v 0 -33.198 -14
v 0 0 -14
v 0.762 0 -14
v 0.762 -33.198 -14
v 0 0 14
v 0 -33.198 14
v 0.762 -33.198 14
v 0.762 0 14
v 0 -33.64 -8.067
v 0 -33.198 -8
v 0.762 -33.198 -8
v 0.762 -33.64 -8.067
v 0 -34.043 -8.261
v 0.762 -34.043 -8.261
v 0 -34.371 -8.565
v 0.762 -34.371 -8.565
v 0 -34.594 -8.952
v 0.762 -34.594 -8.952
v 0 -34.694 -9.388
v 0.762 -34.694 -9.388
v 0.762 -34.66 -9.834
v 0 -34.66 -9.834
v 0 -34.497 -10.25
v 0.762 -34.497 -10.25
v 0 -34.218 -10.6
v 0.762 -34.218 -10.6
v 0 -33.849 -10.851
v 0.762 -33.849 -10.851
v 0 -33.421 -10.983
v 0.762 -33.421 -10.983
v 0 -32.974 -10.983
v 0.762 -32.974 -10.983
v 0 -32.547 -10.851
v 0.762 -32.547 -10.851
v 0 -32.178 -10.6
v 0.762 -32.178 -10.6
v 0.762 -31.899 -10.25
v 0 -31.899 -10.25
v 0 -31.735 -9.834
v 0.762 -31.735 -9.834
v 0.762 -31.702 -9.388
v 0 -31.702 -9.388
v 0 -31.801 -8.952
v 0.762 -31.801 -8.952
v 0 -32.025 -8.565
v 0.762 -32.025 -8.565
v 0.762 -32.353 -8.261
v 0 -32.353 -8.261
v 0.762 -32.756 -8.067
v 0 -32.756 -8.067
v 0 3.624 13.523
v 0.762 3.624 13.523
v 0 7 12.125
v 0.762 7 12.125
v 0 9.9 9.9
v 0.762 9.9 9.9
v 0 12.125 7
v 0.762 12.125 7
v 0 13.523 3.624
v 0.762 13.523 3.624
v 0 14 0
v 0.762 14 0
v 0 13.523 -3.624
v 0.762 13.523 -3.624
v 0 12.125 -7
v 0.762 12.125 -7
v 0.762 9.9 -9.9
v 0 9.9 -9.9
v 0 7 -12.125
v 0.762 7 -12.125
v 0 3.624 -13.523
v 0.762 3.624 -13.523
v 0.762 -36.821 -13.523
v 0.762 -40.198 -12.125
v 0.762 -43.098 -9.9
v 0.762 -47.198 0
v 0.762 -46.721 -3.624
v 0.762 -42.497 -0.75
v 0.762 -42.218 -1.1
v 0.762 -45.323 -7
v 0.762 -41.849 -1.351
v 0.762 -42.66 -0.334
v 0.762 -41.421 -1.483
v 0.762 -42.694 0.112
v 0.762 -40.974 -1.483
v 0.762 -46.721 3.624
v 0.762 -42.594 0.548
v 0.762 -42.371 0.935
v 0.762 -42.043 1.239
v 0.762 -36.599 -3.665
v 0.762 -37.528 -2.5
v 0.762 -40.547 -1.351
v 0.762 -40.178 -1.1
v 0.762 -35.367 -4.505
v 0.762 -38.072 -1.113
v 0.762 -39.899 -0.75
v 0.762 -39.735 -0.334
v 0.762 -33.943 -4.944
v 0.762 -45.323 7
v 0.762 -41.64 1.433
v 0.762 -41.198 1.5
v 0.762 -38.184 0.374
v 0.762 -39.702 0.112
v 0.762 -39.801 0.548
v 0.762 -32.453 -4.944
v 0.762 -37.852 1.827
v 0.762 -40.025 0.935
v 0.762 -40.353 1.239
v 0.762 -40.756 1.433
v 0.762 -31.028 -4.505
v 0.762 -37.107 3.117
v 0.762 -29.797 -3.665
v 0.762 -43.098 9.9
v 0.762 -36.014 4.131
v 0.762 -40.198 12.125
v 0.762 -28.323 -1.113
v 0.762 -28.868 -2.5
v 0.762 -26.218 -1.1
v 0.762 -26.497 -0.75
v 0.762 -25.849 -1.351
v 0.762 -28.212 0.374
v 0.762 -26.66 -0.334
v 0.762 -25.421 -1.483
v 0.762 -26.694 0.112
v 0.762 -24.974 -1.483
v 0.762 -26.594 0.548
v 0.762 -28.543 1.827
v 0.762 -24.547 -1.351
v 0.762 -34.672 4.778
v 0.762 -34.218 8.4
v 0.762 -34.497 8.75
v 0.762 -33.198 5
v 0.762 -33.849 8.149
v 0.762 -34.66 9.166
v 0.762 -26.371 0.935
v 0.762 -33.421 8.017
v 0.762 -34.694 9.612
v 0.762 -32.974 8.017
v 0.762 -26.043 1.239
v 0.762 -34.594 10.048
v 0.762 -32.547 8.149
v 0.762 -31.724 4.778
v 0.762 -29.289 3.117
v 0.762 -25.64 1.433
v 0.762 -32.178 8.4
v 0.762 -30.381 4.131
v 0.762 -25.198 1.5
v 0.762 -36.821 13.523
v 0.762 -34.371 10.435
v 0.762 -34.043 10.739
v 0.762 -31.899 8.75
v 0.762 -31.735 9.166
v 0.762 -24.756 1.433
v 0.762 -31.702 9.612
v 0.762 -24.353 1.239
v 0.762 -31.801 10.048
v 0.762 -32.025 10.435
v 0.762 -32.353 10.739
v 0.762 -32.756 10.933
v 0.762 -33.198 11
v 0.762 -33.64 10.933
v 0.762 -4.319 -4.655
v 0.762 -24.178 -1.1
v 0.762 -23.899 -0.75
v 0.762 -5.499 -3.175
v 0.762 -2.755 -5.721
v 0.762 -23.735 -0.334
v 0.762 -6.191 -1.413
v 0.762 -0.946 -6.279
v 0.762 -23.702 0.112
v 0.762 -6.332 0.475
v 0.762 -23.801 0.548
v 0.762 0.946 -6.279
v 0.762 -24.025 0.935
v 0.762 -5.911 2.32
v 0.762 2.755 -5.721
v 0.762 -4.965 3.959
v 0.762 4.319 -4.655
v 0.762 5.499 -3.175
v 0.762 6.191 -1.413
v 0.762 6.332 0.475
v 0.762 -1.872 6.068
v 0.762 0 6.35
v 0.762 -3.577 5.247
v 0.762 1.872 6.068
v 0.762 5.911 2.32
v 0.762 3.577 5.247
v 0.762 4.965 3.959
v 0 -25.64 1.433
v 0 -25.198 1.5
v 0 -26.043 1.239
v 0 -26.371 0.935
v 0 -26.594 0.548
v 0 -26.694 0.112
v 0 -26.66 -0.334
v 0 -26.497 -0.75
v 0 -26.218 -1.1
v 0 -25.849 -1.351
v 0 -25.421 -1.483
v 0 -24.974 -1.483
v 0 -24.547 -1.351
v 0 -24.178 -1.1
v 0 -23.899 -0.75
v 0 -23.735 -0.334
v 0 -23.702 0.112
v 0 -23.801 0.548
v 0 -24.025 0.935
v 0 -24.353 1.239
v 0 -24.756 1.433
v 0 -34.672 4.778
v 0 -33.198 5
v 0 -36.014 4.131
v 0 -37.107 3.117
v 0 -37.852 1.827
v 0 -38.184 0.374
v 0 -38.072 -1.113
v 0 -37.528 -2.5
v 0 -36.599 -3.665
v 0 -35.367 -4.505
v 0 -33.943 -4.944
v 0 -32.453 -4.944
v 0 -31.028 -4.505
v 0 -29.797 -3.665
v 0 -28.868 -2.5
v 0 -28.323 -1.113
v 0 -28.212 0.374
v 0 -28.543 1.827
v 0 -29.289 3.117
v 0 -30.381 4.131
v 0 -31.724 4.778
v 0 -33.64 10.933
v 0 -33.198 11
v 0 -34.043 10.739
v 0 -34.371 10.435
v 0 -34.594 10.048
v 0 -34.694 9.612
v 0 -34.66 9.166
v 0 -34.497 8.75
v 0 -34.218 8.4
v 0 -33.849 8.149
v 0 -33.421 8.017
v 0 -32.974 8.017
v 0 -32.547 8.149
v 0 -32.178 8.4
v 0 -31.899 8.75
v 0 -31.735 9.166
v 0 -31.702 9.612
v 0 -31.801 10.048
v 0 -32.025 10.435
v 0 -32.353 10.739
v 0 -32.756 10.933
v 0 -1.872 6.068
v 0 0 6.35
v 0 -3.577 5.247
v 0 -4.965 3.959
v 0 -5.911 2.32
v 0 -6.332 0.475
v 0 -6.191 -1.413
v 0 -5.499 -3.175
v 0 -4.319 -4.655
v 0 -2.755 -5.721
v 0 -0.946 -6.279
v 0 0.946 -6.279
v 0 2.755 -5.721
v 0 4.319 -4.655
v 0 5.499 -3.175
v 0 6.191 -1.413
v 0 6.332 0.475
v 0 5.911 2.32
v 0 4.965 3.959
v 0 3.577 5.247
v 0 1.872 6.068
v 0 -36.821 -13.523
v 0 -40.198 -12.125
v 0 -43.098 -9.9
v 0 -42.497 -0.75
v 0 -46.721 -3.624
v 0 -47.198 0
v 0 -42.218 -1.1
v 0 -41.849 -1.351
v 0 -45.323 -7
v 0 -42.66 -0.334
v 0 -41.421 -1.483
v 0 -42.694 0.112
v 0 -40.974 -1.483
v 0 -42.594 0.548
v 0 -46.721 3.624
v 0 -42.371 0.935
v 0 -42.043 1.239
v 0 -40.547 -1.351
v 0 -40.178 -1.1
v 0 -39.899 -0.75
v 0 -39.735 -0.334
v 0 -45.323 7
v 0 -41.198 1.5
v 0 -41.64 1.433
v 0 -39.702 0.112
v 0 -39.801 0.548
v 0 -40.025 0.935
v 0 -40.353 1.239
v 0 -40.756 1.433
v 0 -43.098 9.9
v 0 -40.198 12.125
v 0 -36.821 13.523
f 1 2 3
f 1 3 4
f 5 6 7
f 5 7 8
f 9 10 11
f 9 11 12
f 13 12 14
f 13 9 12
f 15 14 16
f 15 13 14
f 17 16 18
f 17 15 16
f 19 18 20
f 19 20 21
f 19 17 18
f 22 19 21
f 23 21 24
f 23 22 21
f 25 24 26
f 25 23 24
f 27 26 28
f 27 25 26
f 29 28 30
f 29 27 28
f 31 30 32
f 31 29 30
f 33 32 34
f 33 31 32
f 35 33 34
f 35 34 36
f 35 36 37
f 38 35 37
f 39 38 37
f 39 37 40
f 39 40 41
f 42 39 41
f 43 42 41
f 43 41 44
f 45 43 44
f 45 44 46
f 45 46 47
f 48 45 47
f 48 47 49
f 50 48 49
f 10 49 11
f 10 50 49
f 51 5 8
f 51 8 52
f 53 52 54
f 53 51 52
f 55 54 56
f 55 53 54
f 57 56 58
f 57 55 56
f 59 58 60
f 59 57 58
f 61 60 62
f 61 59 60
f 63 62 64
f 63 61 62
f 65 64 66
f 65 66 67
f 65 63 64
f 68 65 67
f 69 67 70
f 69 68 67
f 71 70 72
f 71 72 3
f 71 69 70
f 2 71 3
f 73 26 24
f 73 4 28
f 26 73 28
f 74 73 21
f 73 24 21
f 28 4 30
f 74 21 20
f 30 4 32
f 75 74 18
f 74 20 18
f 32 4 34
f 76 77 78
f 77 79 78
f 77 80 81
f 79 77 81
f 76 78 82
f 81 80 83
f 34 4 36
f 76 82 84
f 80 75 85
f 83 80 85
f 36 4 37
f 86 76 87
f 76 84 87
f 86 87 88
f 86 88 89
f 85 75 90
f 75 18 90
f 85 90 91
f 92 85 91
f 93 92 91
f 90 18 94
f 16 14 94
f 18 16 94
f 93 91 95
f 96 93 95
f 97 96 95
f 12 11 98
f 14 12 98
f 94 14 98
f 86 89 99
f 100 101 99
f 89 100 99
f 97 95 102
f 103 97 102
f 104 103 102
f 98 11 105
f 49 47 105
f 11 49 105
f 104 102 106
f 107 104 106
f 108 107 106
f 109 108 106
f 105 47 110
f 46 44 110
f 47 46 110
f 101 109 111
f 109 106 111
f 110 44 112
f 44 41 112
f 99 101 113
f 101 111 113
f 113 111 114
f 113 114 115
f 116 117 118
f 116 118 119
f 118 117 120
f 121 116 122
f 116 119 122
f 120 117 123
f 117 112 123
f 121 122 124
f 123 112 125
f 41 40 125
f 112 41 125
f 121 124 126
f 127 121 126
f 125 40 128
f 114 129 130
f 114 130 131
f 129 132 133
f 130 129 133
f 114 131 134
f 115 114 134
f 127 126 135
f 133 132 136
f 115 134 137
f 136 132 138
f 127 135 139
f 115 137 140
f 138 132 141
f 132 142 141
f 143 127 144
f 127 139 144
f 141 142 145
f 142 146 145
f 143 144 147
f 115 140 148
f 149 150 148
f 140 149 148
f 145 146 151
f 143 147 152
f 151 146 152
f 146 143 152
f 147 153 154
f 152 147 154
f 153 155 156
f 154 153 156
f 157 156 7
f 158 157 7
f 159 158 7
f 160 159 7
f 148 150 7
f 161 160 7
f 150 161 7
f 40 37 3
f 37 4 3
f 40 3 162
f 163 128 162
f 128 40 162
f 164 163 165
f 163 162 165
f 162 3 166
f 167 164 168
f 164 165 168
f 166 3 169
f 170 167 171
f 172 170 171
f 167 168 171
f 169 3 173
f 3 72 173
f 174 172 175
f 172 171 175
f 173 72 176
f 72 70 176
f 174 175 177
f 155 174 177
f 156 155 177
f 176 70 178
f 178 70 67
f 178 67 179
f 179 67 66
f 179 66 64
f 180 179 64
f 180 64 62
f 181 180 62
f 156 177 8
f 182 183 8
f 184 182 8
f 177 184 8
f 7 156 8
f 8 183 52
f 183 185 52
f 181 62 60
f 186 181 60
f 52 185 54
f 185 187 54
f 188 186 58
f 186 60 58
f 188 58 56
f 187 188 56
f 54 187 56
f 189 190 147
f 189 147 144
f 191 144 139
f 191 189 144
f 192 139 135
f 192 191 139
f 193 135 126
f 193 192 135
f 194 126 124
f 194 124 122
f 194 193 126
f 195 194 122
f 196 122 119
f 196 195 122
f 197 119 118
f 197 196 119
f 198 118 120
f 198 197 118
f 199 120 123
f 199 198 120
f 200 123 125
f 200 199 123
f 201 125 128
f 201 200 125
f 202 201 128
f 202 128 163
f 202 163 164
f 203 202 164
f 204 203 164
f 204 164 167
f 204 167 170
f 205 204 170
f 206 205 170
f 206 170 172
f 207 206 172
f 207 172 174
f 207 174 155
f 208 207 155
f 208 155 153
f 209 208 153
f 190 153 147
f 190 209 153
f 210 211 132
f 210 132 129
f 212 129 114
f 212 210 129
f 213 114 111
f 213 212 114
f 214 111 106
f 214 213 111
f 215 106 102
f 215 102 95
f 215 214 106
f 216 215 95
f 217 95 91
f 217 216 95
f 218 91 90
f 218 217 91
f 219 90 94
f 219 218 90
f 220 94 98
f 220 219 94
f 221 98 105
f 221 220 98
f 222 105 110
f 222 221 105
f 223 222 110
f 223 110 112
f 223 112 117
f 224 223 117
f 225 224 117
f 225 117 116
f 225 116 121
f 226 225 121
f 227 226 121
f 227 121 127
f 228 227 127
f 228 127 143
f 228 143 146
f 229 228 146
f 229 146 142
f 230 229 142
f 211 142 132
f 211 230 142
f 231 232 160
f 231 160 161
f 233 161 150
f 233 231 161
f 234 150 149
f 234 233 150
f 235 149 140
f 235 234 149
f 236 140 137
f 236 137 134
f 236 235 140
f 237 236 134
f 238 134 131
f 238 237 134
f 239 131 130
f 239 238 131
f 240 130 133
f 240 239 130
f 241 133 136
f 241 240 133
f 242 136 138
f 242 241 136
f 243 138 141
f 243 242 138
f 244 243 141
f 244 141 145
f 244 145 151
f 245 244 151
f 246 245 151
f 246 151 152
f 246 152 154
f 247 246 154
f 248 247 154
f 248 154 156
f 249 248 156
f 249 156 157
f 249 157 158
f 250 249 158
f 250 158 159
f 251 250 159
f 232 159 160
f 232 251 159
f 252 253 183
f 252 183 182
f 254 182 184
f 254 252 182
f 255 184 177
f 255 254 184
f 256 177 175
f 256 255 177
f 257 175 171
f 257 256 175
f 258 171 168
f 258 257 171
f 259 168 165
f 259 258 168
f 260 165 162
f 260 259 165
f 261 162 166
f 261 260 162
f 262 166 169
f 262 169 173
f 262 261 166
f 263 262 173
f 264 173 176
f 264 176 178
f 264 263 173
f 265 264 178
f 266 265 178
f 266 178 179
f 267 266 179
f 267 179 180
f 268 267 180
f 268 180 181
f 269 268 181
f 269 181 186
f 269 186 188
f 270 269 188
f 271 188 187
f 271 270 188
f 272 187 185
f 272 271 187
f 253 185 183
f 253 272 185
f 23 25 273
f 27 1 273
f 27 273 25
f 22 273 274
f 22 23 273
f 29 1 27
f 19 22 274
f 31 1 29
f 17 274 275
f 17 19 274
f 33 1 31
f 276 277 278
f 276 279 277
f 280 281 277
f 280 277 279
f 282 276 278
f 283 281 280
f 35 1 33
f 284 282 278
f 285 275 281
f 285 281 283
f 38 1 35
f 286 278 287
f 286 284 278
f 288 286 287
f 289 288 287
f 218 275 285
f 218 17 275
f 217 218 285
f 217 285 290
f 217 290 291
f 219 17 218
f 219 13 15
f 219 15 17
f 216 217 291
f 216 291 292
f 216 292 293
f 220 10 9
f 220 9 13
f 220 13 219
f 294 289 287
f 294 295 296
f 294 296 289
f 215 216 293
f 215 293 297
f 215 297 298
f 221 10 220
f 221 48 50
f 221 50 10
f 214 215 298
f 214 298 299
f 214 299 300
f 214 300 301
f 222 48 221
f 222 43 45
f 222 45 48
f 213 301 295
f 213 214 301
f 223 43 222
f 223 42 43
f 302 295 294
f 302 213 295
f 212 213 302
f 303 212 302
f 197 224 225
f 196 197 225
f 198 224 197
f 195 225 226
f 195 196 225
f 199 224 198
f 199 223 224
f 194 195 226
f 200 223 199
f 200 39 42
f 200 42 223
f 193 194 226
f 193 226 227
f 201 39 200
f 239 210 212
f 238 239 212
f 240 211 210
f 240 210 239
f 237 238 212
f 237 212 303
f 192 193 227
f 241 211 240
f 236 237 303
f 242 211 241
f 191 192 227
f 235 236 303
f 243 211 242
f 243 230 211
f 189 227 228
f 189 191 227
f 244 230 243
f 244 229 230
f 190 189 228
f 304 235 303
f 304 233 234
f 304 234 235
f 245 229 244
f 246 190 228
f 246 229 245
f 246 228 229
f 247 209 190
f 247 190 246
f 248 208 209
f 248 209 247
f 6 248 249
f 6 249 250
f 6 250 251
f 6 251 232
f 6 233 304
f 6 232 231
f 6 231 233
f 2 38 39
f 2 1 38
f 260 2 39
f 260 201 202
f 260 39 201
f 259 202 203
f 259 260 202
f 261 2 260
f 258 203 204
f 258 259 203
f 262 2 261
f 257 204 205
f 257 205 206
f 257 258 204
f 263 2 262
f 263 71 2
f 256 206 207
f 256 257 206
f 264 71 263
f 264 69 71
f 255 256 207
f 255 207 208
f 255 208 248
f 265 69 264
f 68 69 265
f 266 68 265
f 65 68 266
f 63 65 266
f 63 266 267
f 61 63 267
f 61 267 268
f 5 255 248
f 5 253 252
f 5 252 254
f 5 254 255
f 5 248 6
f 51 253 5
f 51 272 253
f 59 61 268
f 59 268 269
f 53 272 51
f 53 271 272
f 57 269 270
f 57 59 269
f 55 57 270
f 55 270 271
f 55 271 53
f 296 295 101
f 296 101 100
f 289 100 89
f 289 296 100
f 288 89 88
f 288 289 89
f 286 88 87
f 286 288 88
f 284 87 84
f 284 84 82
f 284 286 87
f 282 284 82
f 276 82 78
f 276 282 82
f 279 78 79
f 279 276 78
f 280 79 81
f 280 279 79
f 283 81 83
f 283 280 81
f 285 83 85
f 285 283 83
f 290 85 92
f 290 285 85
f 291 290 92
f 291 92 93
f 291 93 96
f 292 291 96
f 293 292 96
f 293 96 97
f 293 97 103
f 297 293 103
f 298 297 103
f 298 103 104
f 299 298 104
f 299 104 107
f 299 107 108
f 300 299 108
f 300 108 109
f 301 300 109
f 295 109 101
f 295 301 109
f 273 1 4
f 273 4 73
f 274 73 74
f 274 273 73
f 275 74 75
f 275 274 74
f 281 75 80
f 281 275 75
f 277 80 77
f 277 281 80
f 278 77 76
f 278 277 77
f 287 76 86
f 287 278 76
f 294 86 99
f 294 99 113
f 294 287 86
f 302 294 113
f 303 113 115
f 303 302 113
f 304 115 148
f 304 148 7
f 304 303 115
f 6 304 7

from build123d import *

# Parameters (mm, degrees)
SKETCH1_R           = 6.35
SKETCH1_R_2         = 1.5
SKETCH1_R_3         = 5
BOSS_EXTRUDE1_DEPTH = 0.762


with BuildPart() as part:
    # Sketch1 → Boss-Extrude1 (new body)
    with BuildSketch(Plane(origin=(0, 0, 0), x_dir=(0, 0, -1), z_dir=(1, 0, 0))):
        with BuildLine():
            Line((14.00048, 0), (14.00048, -33.1978))
            ThreePointArc((14.00048, -33.1978), (0, -47.19828), (-14.00048, -33.1978))
            Line((-14.00048, -33.1978), (-14.00048, 0))
            ThreePointArc((-14.00048, 0), (0, 14.00048), (14.00048, 0))
        make_face()
        with Locations(Location((0, 0, 0), (0, 0, 180))):
            Circle(SKETCH1_R, mode=Mode.SUBTRACT)
        with Locations(Location((0, -25.1978, 0), (0, 0, 180))):
            Circle(SKETCH1_R_2, mode=Mode.SUBTRACT)
        with Locations(Location((0, -41.1978, 0), (0, 0, 180))):
            Circle(SKETCH1_R_2, mode=Mode.SUBTRACT)
        with Locations(Location((-9.5, -33.1978, 0), (0, 0, 180))):
            Circle(SKETCH1_R_2, mode=Mode.SUBTRACT)
        with Locations(Location((9.5, -33.1978, 0), (0, 0, 180))):
            Circle(SKETCH1_R_2, mode=Mode.SUBTRACT)
        with Locations(Location((0, -33.1978, 0), (0, 0, 180))):
            Circle(SKETCH1_R_3, mode=Mode.SUBTRACT)
    extrude(amount=BOSS_EXTRUDE1_DEPTH)


solid = part.part
